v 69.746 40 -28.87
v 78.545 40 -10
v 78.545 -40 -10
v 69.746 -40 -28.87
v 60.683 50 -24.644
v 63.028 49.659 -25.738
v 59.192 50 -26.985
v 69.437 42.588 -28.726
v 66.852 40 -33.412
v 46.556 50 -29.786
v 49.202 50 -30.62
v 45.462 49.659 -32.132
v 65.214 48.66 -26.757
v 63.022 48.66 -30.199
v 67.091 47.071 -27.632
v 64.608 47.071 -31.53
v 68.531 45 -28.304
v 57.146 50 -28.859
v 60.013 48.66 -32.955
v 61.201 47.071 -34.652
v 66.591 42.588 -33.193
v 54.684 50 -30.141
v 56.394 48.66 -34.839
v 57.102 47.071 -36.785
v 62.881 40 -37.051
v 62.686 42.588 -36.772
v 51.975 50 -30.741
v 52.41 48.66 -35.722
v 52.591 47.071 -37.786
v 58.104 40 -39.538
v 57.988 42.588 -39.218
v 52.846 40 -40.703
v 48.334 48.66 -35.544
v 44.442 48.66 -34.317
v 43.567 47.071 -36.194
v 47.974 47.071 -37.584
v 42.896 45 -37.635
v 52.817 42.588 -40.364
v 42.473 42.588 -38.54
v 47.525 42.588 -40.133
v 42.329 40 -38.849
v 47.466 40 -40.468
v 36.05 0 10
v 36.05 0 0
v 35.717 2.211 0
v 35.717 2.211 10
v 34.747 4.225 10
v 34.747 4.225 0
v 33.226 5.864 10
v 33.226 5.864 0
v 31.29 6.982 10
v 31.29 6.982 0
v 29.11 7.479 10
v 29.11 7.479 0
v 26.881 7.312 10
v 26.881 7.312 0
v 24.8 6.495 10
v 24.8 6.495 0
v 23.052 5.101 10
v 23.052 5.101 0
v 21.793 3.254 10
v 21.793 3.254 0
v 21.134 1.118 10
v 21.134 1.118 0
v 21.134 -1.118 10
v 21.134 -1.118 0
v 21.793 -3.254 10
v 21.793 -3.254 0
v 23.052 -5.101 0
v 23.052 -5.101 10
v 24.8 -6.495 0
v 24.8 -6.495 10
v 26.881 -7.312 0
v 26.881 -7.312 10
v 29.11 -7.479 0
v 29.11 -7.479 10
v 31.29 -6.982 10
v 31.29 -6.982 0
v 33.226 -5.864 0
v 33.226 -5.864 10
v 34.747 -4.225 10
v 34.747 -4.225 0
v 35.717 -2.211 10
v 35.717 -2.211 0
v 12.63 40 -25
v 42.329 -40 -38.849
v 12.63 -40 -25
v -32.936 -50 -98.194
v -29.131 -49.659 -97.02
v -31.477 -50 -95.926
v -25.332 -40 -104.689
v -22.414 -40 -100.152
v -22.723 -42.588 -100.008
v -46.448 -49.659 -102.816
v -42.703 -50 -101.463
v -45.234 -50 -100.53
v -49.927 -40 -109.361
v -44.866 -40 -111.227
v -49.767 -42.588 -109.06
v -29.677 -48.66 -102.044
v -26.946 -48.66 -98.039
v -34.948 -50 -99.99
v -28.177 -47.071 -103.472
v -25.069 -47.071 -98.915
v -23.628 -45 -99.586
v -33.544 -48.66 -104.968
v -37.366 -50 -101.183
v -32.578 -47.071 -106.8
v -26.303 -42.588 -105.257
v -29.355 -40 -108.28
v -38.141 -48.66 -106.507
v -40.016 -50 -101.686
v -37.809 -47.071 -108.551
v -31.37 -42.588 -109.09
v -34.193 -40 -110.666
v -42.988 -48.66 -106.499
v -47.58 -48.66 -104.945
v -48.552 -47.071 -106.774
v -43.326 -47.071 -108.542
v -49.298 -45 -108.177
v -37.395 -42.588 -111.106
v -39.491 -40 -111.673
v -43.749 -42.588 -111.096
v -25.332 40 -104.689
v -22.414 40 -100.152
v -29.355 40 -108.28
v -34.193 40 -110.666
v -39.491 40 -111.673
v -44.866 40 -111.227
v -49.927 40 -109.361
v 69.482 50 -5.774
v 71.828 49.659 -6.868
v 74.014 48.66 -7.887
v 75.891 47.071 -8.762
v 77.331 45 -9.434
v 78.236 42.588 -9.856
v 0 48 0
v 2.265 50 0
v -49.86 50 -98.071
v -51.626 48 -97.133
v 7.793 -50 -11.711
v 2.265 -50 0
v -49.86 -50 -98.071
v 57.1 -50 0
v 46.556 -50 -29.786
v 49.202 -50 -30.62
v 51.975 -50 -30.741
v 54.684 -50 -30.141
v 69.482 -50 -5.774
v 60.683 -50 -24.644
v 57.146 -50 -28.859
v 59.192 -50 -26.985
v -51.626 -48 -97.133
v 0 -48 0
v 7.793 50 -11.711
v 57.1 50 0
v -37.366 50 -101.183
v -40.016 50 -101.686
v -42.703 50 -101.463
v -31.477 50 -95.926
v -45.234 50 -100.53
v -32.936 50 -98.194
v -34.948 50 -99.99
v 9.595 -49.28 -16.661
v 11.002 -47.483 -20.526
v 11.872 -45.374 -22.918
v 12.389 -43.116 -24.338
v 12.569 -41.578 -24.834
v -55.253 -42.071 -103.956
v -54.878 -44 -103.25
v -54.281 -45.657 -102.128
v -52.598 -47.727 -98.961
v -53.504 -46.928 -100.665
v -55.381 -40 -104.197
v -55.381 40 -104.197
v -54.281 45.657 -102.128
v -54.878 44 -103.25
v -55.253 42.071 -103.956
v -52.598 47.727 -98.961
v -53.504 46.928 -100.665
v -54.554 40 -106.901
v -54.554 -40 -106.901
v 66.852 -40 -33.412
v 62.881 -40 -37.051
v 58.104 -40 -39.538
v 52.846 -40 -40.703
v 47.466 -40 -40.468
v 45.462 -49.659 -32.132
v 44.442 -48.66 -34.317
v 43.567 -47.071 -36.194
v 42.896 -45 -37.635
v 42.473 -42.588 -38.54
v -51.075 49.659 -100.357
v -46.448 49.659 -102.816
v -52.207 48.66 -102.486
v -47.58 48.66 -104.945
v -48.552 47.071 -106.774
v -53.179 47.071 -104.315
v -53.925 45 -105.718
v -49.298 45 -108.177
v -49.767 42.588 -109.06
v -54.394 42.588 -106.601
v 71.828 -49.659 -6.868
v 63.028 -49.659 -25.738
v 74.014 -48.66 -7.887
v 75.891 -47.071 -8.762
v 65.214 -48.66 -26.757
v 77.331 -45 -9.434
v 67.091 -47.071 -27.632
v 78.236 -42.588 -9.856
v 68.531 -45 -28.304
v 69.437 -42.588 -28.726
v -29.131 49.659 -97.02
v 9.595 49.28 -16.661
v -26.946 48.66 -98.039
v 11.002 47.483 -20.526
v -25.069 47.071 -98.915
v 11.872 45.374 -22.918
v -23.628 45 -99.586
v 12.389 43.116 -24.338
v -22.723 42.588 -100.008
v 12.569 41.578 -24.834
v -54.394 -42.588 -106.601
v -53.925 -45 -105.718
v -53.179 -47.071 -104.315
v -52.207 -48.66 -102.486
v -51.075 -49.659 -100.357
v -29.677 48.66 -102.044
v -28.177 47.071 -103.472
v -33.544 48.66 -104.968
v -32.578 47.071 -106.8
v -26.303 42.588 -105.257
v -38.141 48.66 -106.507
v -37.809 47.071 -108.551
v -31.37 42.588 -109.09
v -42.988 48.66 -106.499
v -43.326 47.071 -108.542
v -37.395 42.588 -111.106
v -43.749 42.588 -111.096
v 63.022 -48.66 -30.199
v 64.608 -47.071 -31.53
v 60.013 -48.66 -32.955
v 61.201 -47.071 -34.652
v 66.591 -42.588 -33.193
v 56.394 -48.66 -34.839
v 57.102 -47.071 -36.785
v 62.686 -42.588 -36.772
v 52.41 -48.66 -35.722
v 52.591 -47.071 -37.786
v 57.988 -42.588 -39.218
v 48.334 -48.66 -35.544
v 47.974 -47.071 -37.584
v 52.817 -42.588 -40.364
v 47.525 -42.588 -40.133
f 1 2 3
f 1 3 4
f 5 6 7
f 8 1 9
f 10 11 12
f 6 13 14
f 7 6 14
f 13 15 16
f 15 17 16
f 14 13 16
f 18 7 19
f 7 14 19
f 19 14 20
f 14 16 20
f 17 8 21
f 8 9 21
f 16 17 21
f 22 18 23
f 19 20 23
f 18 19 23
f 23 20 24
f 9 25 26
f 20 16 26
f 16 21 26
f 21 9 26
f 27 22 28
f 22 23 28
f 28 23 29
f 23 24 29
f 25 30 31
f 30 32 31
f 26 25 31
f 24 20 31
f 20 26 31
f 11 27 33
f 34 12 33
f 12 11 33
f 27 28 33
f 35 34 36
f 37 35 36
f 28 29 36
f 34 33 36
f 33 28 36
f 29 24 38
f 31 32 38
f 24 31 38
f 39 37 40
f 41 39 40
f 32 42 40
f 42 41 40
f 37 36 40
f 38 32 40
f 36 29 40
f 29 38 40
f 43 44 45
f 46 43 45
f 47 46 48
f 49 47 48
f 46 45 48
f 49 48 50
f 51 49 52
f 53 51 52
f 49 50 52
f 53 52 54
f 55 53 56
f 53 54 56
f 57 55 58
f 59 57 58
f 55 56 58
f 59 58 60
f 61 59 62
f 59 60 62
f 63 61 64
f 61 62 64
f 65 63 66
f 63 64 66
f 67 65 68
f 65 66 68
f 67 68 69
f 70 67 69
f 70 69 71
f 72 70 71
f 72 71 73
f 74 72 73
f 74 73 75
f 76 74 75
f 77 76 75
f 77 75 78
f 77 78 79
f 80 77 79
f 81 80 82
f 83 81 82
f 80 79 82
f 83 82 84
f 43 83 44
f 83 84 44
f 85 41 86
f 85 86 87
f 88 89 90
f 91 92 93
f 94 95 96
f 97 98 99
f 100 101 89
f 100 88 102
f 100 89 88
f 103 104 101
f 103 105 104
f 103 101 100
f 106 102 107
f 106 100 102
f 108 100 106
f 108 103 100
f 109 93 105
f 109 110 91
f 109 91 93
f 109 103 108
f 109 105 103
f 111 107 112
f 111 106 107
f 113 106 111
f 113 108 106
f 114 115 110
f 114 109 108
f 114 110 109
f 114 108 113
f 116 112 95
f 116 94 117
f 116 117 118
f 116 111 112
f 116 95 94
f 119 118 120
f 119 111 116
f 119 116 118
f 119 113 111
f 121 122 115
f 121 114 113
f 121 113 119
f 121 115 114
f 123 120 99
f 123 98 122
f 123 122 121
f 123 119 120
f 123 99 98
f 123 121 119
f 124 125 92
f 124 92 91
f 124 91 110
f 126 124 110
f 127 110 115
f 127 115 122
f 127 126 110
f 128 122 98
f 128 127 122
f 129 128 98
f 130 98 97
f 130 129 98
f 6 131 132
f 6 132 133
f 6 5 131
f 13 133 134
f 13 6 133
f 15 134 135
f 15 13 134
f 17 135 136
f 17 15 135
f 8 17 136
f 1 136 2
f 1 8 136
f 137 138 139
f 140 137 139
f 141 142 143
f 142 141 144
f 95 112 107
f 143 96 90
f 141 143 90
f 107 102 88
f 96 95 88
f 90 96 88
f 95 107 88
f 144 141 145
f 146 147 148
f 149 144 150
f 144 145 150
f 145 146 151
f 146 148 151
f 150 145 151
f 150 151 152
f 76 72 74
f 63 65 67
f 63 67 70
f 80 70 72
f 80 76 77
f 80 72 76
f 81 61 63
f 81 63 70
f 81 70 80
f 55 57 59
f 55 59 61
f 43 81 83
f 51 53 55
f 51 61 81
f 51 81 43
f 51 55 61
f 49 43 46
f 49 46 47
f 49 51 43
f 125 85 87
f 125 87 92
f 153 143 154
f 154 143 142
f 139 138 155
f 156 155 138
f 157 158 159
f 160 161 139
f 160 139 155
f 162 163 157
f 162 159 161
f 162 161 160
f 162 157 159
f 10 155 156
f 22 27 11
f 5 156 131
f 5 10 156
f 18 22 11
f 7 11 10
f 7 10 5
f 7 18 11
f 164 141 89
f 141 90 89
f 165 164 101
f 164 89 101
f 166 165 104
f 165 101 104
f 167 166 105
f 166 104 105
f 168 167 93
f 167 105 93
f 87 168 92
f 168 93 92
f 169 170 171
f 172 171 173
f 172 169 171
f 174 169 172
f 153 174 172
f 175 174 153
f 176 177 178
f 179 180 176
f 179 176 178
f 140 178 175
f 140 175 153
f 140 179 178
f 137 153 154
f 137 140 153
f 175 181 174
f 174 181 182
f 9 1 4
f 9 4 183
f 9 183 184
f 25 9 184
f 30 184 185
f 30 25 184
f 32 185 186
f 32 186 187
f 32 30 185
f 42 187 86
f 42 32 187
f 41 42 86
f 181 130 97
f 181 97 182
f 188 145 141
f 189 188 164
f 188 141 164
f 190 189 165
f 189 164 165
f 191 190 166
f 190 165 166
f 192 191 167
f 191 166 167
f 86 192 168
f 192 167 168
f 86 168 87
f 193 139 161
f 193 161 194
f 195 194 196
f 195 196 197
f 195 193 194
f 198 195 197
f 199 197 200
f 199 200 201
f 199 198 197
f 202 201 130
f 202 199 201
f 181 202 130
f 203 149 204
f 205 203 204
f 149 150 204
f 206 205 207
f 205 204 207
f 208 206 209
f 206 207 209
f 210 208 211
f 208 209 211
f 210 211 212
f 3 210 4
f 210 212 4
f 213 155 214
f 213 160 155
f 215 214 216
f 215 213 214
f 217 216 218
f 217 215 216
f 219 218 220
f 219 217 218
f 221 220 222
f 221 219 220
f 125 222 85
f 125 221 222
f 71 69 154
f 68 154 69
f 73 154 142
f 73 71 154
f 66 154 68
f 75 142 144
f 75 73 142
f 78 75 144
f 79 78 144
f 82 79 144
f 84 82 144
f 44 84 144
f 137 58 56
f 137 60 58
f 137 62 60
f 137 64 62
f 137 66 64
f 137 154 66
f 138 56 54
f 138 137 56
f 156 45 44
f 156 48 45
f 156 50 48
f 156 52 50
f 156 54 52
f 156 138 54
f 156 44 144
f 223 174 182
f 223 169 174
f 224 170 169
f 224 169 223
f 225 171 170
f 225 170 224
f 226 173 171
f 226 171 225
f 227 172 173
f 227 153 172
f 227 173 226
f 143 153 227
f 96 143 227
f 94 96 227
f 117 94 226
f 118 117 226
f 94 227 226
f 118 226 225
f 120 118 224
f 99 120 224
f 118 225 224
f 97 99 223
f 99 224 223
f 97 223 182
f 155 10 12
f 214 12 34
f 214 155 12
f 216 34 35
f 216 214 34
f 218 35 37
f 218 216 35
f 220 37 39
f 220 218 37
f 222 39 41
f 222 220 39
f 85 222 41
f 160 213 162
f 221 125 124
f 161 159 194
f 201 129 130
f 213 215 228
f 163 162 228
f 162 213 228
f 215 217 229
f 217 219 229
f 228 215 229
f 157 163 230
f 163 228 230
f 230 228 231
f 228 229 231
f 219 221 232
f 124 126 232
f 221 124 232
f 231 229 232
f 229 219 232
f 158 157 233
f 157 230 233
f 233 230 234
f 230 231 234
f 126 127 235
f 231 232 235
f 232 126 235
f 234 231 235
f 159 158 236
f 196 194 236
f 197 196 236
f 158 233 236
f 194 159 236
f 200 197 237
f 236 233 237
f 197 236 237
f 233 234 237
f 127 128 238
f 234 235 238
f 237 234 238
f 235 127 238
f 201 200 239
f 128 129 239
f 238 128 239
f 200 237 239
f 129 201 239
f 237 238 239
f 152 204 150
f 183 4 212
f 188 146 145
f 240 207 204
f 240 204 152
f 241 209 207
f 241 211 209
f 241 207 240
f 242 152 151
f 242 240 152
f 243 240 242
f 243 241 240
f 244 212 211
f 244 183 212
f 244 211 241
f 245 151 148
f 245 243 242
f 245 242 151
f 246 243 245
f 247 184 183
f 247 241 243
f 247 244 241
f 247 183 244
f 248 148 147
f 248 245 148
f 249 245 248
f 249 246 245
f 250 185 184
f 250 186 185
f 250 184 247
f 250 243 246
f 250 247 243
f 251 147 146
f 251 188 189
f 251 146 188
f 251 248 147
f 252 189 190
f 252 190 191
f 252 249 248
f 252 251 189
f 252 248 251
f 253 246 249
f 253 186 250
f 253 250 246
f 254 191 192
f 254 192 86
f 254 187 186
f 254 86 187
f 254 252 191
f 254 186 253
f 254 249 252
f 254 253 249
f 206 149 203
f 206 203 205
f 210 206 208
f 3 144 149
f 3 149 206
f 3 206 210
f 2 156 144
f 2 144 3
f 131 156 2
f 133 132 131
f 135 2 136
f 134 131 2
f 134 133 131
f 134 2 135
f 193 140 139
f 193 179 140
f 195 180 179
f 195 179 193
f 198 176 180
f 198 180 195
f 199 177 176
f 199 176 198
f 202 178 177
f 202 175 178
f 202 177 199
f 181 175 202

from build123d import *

# Parameters (mm, degrees)
BOSS_EXTRUDE1_DEPTH = 50
SKETCH2_R           = 7.5
BOSS_EXTRUDE2_DEPTH = 10
FILLET1_R           = 10
CHAMFER1_SIZE       = 2


with BuildPart() as part:
    # Sketch1 → Boss-Extrude1 (new body, symmetric)
    with BuildSketch(Plane(origin=(0, 0, 0), x_dir=(1, 0, 0), z_dir=(0, 1, 0))):
        with BuildLine():
            Line((-56.319582284, 105.962751245), (0, 0))
            Line((0, 0), (57.1, 0))
            Line((57.1, 0), (78.545069205, 10))
            Line((78.545069205, 10), (69.74571647, 28.870272836))
            ThreePointArc((69.74571647, 28.870272836), (58.104205428, 39.537752317), (42.329366947, 38.849007995))
            Line((42.329366947, 38.849007995), (12.63007346, 25))
            Line((12.63007346, 25), (-22.414079104, 100.152427697))
            ThreePointArc((-22.414079104, 100.152427697), (-34.192619771, 110.666026263), (-49.926831892, 109.360521003))
            Line((-49.926831892, 109.360521003), (-56.319582284, 105.962751245))
        make_face()
    extrude(amount=BOSS_EXTRUDE1_DEPTH, both=True)

    # Sketch2 → Boss-Extrude2 (add)
    with BuildSketch(Plane.XY):
        with Locations((28.55, 0)):
            Circle(SKETCH2_R)
    extrude(amount=BOSS_EXTRUDE2_DEPTH)

    # Fillet1
    fillet1_edges = [part.edges().sort_by_distance(p)[0] for p in [
        (74.145392838, -50, -19.435136418),
        (-53.123207088, -50, -107.661636124),
        (74.145392838, 50, -19.435136418),
        (58.104205428, 50, -39.537752317),
        (27.479720204, 50, -31.924503997),
        (-4.892002822, 50, -62.576213849),
        (-34.192619771, 50, -110.666026263),
        (-53.123207088, 50, -107.661636124),
        (-34.192619771, -50, -110.666026263),
        (-4.892002822, -50, -62.576213849),
        (27.479720204, -50, -31.924503997),
        (58.104205428, -50, -39.537752317),
    ]]
    fillet(fillet1_edges, radius=FILLET1_R)

    # Chamfer1
    chamfer1_edges = [part.edges().sort_by_distance(p)[0] for p in [
        (-56.319582284, 0, -105.962751245),
        (-25.81314188, -50, -48.566260987),
        (-25.81314188, 50, -48.566260987),
        (-54.944946973, 47.071067812, -103.376436971),
        (-54.944946973, -47.071067812, -103.376436971),
    ]]
    chamfer(chamfer1_edges, length=CHAMFER1_SIZE)


solid = part.part
